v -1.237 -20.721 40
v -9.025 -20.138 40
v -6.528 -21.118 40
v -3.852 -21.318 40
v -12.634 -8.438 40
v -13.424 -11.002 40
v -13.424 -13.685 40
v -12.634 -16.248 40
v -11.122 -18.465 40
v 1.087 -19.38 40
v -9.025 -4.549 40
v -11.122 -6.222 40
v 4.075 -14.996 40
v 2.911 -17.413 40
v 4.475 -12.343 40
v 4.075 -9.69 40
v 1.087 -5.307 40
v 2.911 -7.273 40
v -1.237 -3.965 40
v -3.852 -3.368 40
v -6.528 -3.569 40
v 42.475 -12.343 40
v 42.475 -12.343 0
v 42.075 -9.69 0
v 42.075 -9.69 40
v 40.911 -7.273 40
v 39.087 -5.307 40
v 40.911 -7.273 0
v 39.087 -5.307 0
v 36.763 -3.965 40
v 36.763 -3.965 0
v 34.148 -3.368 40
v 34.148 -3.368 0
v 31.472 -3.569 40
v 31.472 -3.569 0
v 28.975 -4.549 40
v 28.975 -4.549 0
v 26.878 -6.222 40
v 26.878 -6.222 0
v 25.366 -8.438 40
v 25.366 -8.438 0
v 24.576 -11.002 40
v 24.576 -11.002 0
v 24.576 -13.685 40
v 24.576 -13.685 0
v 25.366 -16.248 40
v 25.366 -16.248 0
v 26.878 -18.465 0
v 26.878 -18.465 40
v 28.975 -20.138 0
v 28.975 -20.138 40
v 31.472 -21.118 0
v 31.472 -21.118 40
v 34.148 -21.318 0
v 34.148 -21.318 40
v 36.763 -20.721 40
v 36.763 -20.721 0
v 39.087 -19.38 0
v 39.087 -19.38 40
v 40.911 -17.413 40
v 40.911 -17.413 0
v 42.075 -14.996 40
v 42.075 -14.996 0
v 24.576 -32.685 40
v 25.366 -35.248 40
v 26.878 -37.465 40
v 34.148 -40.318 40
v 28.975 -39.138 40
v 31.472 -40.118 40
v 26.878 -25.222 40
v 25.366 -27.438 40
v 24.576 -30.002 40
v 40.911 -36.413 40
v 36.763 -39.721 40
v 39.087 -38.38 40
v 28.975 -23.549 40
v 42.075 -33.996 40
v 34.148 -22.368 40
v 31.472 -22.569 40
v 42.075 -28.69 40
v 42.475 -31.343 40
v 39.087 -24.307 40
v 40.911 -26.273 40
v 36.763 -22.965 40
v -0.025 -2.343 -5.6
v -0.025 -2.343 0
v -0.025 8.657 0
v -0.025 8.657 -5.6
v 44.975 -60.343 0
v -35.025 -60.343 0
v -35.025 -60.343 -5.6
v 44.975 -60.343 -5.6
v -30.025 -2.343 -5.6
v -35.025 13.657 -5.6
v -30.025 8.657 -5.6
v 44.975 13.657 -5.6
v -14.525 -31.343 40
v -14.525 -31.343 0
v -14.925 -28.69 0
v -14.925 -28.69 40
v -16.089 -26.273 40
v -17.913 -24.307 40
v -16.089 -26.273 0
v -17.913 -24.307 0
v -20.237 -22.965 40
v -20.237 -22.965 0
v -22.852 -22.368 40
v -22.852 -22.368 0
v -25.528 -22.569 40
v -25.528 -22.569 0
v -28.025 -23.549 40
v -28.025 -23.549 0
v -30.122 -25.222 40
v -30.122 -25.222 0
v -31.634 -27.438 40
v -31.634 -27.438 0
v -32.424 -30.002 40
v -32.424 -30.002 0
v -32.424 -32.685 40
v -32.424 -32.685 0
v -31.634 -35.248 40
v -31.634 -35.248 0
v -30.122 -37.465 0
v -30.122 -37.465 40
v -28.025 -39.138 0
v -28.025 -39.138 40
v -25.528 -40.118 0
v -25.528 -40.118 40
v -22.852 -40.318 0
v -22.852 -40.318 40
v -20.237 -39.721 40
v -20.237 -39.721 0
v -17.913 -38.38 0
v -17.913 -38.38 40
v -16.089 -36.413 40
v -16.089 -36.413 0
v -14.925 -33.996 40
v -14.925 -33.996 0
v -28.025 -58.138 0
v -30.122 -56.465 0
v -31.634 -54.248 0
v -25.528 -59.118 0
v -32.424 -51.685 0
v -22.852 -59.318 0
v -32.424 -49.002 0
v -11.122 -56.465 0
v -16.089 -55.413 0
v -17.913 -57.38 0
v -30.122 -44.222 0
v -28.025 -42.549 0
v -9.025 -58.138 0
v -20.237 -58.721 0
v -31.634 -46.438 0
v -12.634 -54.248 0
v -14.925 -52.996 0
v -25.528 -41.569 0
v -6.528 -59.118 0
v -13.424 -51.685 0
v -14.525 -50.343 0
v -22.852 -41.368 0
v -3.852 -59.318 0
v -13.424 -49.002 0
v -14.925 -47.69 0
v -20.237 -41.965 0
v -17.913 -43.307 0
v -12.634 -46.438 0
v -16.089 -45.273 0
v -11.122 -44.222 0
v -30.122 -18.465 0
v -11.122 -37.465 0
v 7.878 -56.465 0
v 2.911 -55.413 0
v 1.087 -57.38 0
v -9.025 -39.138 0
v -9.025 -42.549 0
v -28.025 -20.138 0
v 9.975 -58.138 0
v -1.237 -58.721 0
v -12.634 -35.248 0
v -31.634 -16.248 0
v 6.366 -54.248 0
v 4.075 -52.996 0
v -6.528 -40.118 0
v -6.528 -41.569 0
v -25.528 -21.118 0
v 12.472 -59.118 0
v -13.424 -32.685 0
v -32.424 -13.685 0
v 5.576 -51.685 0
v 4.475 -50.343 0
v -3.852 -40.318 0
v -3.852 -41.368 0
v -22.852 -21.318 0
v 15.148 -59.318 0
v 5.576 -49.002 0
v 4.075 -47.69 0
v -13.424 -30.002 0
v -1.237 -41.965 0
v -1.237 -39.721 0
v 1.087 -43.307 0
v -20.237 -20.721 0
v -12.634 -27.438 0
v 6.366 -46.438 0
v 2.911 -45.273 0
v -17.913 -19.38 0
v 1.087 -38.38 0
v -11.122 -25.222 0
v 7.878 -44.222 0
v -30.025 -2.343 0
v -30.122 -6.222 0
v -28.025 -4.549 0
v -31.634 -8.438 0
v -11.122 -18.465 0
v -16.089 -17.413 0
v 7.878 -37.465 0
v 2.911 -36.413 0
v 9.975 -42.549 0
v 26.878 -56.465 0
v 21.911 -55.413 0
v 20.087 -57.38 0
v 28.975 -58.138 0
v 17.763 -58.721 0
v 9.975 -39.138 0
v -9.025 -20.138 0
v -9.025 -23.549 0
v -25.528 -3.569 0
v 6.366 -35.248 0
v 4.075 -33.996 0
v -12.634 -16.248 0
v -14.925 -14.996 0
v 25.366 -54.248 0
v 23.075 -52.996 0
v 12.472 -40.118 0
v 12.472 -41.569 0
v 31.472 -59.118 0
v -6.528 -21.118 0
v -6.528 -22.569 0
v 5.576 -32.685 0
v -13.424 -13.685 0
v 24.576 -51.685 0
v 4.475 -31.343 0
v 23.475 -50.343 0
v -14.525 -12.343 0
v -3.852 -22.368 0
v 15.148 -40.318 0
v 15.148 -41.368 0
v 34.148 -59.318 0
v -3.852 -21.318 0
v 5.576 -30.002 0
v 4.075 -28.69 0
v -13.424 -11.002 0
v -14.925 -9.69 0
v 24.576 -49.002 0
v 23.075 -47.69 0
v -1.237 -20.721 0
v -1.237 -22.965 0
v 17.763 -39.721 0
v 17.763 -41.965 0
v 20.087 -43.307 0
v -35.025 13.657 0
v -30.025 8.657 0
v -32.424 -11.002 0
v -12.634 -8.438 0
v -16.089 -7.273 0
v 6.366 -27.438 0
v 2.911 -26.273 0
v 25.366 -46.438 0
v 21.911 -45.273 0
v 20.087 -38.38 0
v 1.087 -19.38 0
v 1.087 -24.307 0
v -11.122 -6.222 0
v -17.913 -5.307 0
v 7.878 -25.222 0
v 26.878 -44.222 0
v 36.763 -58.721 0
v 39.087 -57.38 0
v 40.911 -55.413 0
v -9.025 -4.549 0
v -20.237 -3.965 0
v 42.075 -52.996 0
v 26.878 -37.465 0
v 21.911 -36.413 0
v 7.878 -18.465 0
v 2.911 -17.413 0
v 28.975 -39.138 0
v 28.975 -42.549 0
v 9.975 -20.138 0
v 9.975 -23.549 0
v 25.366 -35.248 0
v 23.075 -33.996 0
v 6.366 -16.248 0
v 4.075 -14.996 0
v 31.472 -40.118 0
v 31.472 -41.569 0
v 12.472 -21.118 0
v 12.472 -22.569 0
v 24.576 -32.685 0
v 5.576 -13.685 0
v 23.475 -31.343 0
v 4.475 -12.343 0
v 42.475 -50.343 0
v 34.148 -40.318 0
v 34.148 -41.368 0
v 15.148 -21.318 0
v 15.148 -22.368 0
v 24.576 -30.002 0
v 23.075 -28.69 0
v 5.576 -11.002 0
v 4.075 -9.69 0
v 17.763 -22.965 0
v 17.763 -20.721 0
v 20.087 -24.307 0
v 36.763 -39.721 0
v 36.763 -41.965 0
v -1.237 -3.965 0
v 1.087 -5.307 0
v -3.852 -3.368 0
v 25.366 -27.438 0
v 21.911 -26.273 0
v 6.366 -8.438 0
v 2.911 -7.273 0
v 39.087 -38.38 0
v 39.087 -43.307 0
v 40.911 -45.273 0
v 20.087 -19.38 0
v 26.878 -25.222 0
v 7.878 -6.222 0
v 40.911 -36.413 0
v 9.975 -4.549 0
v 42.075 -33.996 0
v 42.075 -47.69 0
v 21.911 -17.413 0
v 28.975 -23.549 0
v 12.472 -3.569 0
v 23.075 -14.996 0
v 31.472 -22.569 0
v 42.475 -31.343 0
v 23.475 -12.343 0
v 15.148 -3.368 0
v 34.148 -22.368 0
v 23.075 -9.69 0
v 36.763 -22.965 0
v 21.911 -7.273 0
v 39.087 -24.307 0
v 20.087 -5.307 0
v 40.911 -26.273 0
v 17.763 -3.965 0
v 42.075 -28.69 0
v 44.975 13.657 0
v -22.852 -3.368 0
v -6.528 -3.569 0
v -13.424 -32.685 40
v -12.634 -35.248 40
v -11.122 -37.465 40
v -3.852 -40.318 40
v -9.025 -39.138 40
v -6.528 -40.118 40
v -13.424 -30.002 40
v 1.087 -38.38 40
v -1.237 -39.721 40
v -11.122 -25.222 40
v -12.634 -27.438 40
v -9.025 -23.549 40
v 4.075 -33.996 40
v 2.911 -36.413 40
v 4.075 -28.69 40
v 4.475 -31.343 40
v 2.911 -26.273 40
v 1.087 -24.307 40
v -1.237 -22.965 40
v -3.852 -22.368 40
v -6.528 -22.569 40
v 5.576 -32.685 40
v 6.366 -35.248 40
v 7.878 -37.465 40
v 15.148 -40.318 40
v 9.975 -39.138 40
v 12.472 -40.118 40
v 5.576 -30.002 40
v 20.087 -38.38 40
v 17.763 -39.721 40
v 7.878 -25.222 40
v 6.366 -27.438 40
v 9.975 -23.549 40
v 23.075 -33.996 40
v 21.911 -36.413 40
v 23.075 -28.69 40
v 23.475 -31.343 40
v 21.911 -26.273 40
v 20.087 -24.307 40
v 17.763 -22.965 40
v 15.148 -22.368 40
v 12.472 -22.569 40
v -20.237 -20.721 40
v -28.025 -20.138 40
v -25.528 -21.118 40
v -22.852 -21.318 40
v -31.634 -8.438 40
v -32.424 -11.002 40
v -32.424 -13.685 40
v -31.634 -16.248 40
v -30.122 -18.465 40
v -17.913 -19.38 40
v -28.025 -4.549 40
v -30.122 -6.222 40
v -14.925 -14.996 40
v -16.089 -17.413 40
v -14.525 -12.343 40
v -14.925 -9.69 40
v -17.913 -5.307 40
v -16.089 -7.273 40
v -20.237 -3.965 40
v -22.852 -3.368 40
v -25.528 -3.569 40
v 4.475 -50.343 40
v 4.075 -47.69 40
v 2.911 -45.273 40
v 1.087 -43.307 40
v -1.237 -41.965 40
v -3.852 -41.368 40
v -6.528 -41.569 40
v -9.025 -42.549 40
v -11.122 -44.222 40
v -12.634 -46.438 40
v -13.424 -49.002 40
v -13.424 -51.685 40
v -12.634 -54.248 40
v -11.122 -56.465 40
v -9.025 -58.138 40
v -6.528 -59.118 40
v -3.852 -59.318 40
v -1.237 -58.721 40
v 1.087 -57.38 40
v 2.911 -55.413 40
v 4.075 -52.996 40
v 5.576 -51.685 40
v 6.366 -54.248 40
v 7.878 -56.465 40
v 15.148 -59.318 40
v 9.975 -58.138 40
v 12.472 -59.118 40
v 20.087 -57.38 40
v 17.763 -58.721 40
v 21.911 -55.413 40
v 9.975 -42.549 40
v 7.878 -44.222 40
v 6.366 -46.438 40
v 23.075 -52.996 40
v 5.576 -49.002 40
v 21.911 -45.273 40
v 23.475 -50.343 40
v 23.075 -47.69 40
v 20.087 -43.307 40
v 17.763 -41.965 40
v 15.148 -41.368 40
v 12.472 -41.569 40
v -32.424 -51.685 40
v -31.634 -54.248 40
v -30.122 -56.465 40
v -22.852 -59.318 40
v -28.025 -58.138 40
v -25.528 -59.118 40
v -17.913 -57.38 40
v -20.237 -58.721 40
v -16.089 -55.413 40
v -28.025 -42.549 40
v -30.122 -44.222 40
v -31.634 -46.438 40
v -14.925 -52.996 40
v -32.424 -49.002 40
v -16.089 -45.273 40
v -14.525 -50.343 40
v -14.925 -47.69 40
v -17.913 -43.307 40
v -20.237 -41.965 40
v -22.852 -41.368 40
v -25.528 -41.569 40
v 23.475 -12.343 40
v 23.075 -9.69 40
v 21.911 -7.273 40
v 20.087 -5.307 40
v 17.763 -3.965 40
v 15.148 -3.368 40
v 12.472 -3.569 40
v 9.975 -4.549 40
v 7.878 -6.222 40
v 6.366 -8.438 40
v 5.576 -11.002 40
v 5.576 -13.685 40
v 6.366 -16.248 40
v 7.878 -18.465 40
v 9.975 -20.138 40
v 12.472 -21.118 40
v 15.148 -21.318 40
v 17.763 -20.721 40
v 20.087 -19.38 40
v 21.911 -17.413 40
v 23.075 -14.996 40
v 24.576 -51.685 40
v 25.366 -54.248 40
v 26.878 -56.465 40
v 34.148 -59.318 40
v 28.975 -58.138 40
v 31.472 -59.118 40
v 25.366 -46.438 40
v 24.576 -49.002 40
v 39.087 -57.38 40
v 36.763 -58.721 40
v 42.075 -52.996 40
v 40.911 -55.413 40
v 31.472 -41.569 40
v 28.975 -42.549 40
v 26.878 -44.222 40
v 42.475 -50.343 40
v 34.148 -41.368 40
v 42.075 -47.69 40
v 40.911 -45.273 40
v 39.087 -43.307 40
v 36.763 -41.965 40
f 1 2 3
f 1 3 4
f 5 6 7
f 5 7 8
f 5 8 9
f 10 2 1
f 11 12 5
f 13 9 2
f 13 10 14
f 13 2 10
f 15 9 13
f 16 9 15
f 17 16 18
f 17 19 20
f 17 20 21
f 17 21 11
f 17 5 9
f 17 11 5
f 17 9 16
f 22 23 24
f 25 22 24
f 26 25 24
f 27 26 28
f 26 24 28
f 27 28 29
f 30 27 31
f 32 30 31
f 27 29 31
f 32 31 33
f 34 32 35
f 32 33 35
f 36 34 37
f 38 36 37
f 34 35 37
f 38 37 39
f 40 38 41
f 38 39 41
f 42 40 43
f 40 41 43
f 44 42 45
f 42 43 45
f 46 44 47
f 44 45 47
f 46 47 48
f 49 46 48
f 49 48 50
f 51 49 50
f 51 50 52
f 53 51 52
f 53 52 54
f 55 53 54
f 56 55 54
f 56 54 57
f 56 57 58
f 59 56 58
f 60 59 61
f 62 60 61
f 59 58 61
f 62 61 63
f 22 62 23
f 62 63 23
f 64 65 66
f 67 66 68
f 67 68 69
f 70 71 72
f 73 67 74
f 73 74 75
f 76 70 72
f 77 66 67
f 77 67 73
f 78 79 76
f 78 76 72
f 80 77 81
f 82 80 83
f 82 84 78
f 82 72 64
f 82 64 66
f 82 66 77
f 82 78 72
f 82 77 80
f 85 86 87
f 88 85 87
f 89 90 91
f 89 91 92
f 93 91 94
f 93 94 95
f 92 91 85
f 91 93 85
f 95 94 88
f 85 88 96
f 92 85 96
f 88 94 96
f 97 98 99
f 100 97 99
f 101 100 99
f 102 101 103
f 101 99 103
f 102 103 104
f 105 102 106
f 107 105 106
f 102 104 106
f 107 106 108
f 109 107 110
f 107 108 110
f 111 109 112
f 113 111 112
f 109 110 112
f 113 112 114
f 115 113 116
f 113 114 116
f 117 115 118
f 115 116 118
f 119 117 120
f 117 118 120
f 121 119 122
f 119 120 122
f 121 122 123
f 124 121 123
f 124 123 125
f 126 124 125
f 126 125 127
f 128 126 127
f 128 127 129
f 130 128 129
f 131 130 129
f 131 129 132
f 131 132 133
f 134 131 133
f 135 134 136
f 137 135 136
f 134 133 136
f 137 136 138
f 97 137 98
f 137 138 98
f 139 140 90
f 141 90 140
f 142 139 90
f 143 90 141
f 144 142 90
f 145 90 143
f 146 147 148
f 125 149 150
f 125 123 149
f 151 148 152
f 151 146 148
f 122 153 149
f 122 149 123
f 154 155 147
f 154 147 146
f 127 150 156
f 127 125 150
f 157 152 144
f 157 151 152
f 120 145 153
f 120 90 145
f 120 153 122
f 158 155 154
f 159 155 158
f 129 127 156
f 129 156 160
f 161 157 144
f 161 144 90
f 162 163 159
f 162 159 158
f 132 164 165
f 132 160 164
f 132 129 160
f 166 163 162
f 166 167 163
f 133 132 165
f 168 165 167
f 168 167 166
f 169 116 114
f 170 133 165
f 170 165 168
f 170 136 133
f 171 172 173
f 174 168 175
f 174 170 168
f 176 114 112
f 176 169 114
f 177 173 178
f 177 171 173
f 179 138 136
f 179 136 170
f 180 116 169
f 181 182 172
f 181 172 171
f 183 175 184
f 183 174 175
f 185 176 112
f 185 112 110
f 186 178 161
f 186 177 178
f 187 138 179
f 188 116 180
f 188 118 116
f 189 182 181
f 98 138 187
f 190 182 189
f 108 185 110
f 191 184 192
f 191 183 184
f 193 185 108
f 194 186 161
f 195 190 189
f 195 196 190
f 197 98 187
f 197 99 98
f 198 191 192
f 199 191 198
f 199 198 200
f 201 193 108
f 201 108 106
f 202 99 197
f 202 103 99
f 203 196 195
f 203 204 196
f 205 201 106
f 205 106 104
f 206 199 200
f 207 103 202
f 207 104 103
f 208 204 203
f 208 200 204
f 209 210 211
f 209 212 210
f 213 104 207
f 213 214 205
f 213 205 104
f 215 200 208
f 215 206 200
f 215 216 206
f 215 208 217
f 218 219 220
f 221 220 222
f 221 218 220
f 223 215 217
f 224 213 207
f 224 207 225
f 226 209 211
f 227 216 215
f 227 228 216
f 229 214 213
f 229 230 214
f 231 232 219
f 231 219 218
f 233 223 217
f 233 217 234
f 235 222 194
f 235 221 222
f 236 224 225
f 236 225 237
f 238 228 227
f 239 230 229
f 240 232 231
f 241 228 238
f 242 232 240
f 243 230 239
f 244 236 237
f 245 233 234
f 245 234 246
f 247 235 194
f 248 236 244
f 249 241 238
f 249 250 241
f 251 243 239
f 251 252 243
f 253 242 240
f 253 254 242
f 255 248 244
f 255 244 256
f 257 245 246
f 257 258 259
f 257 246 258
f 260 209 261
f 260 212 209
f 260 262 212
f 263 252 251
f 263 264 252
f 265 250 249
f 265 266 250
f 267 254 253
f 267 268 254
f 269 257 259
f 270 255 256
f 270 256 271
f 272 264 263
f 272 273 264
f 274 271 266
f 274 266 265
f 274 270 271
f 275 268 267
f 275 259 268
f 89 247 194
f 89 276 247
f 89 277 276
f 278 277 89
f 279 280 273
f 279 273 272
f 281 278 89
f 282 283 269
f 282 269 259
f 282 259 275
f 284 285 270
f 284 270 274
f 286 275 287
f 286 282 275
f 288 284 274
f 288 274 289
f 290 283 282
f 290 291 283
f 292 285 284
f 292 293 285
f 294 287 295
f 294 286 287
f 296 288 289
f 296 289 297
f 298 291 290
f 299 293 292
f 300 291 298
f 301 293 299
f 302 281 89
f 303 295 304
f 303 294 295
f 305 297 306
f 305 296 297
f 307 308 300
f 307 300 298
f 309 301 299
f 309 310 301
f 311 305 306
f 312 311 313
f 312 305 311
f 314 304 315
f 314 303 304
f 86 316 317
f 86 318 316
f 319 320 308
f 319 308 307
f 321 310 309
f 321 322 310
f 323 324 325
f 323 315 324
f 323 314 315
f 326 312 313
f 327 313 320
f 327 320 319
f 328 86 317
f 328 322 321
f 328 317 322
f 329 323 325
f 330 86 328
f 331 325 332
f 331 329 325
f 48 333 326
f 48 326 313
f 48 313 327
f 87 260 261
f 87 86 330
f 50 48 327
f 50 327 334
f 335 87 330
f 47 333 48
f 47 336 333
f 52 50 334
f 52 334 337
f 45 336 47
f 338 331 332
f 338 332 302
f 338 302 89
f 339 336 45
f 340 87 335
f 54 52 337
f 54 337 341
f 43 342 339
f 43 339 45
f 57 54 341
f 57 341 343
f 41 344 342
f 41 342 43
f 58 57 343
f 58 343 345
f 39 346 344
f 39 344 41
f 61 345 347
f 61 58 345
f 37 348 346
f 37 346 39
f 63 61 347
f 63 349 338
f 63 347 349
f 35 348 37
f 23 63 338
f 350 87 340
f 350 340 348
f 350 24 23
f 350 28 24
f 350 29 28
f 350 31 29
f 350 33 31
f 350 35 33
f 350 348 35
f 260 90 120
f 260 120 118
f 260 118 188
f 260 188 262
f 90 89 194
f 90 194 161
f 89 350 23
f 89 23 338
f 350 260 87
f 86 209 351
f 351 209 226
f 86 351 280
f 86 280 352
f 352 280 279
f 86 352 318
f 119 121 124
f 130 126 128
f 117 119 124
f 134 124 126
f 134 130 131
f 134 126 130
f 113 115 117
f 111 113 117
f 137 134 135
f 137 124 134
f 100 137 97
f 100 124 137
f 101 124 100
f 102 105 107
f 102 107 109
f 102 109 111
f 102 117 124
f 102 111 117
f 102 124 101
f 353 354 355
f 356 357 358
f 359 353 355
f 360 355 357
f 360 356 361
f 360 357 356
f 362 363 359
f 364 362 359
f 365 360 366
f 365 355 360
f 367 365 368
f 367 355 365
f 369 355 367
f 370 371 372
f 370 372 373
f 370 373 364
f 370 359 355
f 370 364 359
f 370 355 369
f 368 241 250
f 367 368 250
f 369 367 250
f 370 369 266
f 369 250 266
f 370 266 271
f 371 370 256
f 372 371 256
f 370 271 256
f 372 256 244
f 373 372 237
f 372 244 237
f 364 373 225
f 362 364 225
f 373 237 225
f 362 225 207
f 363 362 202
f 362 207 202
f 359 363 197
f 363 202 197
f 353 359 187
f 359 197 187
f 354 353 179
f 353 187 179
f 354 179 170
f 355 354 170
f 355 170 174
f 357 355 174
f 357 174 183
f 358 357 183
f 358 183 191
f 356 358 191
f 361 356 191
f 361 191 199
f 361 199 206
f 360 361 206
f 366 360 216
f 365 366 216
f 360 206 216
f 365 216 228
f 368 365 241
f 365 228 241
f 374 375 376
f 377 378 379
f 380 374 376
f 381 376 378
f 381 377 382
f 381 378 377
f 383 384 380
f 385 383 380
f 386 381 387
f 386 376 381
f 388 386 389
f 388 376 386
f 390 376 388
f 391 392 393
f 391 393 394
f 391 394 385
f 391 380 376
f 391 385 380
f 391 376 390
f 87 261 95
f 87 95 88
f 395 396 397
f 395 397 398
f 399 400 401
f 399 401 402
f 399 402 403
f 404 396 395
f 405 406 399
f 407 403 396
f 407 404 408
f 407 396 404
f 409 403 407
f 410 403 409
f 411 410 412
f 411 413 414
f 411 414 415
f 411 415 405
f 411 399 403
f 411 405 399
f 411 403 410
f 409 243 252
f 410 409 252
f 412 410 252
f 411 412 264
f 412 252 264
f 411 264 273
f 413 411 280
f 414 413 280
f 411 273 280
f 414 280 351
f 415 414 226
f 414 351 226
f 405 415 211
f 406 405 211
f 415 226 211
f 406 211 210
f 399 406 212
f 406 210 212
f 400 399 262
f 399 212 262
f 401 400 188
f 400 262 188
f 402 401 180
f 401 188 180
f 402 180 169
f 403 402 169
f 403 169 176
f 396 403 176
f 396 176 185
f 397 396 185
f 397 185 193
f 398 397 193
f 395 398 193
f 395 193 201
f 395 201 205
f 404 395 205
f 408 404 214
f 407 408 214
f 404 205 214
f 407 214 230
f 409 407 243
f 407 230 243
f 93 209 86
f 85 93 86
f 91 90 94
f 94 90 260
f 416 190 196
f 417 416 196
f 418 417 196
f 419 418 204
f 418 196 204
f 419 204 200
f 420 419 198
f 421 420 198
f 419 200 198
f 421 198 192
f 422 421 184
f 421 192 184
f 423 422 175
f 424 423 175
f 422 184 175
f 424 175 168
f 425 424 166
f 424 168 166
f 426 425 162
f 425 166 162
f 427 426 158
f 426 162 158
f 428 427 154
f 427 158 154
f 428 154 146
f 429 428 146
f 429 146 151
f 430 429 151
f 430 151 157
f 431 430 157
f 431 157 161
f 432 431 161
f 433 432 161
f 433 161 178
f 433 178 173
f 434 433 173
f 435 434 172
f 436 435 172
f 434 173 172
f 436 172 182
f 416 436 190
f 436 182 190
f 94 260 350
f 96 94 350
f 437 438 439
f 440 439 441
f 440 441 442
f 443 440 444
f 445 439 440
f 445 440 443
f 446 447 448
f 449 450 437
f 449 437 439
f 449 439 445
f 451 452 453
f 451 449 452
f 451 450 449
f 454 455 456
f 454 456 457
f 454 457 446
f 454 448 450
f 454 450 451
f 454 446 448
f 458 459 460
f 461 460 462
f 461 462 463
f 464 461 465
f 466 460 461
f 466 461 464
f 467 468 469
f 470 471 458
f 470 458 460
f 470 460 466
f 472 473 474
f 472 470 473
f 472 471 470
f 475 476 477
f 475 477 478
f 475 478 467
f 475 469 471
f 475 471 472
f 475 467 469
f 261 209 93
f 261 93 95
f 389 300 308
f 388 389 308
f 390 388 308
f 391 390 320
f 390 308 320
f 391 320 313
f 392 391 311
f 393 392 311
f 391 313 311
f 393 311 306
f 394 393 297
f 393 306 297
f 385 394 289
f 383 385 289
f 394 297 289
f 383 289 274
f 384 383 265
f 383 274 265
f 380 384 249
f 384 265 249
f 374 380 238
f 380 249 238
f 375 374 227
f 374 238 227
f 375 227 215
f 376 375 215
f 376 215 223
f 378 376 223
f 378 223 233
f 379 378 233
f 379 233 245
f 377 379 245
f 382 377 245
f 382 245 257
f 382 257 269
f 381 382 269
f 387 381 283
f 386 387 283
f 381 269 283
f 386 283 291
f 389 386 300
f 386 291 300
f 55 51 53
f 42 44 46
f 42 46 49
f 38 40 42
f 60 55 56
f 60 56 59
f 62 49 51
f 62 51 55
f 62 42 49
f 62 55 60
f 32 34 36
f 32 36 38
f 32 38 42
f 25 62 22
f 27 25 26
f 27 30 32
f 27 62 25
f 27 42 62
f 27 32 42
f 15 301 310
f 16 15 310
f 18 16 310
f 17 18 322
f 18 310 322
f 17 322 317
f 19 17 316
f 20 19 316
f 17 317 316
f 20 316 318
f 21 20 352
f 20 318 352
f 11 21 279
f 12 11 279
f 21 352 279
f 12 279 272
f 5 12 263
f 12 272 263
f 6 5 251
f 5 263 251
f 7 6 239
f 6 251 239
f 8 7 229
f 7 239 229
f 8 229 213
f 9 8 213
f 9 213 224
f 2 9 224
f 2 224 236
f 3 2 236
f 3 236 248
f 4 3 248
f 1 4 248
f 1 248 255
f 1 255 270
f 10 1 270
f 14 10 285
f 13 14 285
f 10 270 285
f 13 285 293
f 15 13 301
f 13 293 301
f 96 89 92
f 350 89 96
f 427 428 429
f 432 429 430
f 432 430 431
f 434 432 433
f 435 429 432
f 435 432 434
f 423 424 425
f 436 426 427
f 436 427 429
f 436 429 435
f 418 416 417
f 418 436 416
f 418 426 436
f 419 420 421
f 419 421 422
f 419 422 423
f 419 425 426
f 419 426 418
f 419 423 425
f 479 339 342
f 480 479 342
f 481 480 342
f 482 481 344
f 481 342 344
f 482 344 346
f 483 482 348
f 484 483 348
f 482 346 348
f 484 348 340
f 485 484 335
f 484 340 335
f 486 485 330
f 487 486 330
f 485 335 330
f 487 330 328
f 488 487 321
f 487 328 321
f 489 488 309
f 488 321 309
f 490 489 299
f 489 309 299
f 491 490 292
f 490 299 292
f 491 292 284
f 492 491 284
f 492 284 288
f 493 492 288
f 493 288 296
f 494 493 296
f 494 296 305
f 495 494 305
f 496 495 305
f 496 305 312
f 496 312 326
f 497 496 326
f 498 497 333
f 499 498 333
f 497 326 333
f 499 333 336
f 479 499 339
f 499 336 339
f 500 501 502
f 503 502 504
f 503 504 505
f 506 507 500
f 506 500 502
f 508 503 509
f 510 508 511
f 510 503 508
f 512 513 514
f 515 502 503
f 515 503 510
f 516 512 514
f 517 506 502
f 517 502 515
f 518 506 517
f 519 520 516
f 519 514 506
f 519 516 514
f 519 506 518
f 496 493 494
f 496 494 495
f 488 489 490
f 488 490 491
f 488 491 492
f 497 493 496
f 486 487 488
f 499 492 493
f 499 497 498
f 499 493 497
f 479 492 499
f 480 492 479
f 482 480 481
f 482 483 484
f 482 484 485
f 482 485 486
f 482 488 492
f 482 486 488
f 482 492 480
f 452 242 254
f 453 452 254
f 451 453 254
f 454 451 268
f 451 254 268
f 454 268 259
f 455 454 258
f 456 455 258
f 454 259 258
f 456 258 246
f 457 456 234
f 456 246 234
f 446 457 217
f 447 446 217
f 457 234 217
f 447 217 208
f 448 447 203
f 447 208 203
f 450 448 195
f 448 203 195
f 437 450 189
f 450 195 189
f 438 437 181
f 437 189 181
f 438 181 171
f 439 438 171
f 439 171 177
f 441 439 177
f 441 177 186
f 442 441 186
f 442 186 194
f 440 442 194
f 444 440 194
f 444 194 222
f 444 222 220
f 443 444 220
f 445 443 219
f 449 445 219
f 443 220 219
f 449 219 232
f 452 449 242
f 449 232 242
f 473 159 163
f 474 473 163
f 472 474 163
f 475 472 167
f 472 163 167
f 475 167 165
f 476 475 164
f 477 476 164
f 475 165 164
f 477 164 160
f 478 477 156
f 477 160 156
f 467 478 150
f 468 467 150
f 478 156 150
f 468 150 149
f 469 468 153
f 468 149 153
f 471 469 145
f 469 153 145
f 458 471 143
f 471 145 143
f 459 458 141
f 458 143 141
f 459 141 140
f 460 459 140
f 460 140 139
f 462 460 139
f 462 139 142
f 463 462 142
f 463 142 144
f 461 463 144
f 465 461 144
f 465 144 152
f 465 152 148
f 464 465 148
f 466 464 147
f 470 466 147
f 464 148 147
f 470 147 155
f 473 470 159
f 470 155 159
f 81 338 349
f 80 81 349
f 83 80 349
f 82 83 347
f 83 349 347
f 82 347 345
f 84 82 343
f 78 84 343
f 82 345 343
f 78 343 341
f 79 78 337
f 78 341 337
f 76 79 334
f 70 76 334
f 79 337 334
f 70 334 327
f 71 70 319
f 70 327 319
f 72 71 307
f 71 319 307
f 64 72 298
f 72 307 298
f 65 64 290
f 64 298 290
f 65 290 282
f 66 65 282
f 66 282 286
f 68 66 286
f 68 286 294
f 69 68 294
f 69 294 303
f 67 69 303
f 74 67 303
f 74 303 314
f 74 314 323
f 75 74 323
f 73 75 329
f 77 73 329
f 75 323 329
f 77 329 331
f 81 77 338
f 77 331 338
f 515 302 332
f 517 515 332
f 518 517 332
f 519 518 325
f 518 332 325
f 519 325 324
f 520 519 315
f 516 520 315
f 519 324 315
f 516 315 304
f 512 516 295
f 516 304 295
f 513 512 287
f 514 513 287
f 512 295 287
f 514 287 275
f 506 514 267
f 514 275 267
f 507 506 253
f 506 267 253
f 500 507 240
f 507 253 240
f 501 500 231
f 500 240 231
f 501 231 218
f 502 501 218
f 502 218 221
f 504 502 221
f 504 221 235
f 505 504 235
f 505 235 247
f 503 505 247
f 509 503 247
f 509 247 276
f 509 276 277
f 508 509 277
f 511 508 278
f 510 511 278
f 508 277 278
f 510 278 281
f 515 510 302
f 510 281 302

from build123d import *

# Parameters (mm, degrees)
SKETCH_1_W      = 80
SKETCH_1_H      = 74
SKETCH_1_W_2    = 30
SKETCH_1_H_2    = 11
EXTRUDE_1_DEPTH = 5.6
SKETCH_2_R      = 9
EXTRUDE_2_DEPTH = 40


with BuildPart() as part:
    # 草图1 → 凸台-拉伸1 (new body)
    with BuildSketch(Plane.XY):
        with Locations((4.975124378, -23.343283582)):
            Rectangle(SKETCH_1_W, SKETCH_1_H)
        with Locations((-15.024875622, 3.156716418)):
            Rectangle(SKETCH_1_W_2, SKETCH_1_H_2, mode=Mode.SUBTRACT)
    extrude(amount=-EXTRUDE_1_DEPTH)

    # 草图2 → 凸台-拉伸2 (add)
    with BuildSketch(Plane.XY):
        with Locations((-23.524875622, -50.343283582)):
            Circle(SKETCH_2_R)
        with Locations((-4.524875622, -50.343283582)):
            Circle(SKETCH_2_R)
        with Locations((14.475124378, -50.343283582)):
            Circle(SKETCH_2_R)
        with Locations((33.475124378, -50.343283582)):
            Circle(SKETCH_2_R)
        with Locations((-4.524875622, -31.343283582)):
            Circle(SKETCH_2_R)
        with Locations((14.475124378, -31.343283582)):
            Circle(SKETCH_2_R)
        with Locations((33.475124378, -31.343283582)):
            Circle(SKETCH_2_R)
        with Locations((-4.524875622, -12.343283582)):
            Circle(SKETCH_2_R)
        with Locations((14.475124378, -12.343283582)):
            Circle(SKETCH_2_R)
        with Locations((33.475124378, -12.343283582)):
            Circle(SKETCH_2_R)
        with Locations((-23.524875622, -31.343283582)):
            Circle(SKETCH_2_R)
        with Locations((-23.524875622, -12.343283582)):
            Circle(SKETCH_2_R)
    extrude(amount=EXTRUDE_2_DEPTH)


solid = part.part
